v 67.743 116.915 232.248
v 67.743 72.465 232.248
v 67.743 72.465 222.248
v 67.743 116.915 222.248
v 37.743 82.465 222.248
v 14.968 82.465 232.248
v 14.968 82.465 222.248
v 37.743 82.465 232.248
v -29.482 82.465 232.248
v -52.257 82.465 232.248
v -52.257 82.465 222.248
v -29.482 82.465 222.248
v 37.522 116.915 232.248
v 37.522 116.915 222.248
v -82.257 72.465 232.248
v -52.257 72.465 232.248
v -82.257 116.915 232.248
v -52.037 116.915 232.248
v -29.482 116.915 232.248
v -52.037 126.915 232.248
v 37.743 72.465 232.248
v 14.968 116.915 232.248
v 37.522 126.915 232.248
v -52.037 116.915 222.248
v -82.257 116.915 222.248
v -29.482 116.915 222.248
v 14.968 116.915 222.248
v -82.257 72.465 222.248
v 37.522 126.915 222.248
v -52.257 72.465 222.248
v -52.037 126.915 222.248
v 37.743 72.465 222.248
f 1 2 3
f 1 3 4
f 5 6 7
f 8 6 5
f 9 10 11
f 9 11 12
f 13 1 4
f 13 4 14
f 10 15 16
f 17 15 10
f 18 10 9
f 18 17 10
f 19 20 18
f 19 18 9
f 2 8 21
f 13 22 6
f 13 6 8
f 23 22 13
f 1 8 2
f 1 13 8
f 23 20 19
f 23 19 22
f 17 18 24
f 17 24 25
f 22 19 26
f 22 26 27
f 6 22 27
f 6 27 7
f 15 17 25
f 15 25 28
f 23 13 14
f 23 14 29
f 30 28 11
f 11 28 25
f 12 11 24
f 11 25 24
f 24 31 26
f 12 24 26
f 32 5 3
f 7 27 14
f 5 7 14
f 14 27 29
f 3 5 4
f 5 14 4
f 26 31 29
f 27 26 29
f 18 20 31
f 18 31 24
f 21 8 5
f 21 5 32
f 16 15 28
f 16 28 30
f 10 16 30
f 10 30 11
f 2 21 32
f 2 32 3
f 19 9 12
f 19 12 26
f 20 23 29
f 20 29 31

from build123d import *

# Parameters (mm, degrees)
BOSS_EXTRUDE1_DEPTH = 10


with BuildPart() as part:
    # Sketch1 → Boss-Extrude1 (new body)
    with BuildSketch(Plane.XY.offset(232.248004761)):
        Polygon((-82.257473883, 116.914823413), (-82.257473883, 82.464823413), (-82.257473883, 72.464823413), (-52.257473883, 72.464823413), (-52.257473883, 82.464823413), (-29.482473883, 82.464823413), (-29.482473883, 116.914823413), (14.967526117, 116.914823413), (14.967526117, 82.464823413), (37.742526117, 82.464823413), (37.742526117, 72.464823413), (67.742526117, 72.464823413), (67.742526117, 82.464823413), (67.742526117, 116.914823413), (37.52195778, 116.914823413), (37.52195778, 126.914823413), (-52.036905545, 126.914823413), (-52.036905545, 116.914823413), align=None)
    extrude(amount=-BOSS_EXTRUDE1_DEPTH)


solid = part.part
